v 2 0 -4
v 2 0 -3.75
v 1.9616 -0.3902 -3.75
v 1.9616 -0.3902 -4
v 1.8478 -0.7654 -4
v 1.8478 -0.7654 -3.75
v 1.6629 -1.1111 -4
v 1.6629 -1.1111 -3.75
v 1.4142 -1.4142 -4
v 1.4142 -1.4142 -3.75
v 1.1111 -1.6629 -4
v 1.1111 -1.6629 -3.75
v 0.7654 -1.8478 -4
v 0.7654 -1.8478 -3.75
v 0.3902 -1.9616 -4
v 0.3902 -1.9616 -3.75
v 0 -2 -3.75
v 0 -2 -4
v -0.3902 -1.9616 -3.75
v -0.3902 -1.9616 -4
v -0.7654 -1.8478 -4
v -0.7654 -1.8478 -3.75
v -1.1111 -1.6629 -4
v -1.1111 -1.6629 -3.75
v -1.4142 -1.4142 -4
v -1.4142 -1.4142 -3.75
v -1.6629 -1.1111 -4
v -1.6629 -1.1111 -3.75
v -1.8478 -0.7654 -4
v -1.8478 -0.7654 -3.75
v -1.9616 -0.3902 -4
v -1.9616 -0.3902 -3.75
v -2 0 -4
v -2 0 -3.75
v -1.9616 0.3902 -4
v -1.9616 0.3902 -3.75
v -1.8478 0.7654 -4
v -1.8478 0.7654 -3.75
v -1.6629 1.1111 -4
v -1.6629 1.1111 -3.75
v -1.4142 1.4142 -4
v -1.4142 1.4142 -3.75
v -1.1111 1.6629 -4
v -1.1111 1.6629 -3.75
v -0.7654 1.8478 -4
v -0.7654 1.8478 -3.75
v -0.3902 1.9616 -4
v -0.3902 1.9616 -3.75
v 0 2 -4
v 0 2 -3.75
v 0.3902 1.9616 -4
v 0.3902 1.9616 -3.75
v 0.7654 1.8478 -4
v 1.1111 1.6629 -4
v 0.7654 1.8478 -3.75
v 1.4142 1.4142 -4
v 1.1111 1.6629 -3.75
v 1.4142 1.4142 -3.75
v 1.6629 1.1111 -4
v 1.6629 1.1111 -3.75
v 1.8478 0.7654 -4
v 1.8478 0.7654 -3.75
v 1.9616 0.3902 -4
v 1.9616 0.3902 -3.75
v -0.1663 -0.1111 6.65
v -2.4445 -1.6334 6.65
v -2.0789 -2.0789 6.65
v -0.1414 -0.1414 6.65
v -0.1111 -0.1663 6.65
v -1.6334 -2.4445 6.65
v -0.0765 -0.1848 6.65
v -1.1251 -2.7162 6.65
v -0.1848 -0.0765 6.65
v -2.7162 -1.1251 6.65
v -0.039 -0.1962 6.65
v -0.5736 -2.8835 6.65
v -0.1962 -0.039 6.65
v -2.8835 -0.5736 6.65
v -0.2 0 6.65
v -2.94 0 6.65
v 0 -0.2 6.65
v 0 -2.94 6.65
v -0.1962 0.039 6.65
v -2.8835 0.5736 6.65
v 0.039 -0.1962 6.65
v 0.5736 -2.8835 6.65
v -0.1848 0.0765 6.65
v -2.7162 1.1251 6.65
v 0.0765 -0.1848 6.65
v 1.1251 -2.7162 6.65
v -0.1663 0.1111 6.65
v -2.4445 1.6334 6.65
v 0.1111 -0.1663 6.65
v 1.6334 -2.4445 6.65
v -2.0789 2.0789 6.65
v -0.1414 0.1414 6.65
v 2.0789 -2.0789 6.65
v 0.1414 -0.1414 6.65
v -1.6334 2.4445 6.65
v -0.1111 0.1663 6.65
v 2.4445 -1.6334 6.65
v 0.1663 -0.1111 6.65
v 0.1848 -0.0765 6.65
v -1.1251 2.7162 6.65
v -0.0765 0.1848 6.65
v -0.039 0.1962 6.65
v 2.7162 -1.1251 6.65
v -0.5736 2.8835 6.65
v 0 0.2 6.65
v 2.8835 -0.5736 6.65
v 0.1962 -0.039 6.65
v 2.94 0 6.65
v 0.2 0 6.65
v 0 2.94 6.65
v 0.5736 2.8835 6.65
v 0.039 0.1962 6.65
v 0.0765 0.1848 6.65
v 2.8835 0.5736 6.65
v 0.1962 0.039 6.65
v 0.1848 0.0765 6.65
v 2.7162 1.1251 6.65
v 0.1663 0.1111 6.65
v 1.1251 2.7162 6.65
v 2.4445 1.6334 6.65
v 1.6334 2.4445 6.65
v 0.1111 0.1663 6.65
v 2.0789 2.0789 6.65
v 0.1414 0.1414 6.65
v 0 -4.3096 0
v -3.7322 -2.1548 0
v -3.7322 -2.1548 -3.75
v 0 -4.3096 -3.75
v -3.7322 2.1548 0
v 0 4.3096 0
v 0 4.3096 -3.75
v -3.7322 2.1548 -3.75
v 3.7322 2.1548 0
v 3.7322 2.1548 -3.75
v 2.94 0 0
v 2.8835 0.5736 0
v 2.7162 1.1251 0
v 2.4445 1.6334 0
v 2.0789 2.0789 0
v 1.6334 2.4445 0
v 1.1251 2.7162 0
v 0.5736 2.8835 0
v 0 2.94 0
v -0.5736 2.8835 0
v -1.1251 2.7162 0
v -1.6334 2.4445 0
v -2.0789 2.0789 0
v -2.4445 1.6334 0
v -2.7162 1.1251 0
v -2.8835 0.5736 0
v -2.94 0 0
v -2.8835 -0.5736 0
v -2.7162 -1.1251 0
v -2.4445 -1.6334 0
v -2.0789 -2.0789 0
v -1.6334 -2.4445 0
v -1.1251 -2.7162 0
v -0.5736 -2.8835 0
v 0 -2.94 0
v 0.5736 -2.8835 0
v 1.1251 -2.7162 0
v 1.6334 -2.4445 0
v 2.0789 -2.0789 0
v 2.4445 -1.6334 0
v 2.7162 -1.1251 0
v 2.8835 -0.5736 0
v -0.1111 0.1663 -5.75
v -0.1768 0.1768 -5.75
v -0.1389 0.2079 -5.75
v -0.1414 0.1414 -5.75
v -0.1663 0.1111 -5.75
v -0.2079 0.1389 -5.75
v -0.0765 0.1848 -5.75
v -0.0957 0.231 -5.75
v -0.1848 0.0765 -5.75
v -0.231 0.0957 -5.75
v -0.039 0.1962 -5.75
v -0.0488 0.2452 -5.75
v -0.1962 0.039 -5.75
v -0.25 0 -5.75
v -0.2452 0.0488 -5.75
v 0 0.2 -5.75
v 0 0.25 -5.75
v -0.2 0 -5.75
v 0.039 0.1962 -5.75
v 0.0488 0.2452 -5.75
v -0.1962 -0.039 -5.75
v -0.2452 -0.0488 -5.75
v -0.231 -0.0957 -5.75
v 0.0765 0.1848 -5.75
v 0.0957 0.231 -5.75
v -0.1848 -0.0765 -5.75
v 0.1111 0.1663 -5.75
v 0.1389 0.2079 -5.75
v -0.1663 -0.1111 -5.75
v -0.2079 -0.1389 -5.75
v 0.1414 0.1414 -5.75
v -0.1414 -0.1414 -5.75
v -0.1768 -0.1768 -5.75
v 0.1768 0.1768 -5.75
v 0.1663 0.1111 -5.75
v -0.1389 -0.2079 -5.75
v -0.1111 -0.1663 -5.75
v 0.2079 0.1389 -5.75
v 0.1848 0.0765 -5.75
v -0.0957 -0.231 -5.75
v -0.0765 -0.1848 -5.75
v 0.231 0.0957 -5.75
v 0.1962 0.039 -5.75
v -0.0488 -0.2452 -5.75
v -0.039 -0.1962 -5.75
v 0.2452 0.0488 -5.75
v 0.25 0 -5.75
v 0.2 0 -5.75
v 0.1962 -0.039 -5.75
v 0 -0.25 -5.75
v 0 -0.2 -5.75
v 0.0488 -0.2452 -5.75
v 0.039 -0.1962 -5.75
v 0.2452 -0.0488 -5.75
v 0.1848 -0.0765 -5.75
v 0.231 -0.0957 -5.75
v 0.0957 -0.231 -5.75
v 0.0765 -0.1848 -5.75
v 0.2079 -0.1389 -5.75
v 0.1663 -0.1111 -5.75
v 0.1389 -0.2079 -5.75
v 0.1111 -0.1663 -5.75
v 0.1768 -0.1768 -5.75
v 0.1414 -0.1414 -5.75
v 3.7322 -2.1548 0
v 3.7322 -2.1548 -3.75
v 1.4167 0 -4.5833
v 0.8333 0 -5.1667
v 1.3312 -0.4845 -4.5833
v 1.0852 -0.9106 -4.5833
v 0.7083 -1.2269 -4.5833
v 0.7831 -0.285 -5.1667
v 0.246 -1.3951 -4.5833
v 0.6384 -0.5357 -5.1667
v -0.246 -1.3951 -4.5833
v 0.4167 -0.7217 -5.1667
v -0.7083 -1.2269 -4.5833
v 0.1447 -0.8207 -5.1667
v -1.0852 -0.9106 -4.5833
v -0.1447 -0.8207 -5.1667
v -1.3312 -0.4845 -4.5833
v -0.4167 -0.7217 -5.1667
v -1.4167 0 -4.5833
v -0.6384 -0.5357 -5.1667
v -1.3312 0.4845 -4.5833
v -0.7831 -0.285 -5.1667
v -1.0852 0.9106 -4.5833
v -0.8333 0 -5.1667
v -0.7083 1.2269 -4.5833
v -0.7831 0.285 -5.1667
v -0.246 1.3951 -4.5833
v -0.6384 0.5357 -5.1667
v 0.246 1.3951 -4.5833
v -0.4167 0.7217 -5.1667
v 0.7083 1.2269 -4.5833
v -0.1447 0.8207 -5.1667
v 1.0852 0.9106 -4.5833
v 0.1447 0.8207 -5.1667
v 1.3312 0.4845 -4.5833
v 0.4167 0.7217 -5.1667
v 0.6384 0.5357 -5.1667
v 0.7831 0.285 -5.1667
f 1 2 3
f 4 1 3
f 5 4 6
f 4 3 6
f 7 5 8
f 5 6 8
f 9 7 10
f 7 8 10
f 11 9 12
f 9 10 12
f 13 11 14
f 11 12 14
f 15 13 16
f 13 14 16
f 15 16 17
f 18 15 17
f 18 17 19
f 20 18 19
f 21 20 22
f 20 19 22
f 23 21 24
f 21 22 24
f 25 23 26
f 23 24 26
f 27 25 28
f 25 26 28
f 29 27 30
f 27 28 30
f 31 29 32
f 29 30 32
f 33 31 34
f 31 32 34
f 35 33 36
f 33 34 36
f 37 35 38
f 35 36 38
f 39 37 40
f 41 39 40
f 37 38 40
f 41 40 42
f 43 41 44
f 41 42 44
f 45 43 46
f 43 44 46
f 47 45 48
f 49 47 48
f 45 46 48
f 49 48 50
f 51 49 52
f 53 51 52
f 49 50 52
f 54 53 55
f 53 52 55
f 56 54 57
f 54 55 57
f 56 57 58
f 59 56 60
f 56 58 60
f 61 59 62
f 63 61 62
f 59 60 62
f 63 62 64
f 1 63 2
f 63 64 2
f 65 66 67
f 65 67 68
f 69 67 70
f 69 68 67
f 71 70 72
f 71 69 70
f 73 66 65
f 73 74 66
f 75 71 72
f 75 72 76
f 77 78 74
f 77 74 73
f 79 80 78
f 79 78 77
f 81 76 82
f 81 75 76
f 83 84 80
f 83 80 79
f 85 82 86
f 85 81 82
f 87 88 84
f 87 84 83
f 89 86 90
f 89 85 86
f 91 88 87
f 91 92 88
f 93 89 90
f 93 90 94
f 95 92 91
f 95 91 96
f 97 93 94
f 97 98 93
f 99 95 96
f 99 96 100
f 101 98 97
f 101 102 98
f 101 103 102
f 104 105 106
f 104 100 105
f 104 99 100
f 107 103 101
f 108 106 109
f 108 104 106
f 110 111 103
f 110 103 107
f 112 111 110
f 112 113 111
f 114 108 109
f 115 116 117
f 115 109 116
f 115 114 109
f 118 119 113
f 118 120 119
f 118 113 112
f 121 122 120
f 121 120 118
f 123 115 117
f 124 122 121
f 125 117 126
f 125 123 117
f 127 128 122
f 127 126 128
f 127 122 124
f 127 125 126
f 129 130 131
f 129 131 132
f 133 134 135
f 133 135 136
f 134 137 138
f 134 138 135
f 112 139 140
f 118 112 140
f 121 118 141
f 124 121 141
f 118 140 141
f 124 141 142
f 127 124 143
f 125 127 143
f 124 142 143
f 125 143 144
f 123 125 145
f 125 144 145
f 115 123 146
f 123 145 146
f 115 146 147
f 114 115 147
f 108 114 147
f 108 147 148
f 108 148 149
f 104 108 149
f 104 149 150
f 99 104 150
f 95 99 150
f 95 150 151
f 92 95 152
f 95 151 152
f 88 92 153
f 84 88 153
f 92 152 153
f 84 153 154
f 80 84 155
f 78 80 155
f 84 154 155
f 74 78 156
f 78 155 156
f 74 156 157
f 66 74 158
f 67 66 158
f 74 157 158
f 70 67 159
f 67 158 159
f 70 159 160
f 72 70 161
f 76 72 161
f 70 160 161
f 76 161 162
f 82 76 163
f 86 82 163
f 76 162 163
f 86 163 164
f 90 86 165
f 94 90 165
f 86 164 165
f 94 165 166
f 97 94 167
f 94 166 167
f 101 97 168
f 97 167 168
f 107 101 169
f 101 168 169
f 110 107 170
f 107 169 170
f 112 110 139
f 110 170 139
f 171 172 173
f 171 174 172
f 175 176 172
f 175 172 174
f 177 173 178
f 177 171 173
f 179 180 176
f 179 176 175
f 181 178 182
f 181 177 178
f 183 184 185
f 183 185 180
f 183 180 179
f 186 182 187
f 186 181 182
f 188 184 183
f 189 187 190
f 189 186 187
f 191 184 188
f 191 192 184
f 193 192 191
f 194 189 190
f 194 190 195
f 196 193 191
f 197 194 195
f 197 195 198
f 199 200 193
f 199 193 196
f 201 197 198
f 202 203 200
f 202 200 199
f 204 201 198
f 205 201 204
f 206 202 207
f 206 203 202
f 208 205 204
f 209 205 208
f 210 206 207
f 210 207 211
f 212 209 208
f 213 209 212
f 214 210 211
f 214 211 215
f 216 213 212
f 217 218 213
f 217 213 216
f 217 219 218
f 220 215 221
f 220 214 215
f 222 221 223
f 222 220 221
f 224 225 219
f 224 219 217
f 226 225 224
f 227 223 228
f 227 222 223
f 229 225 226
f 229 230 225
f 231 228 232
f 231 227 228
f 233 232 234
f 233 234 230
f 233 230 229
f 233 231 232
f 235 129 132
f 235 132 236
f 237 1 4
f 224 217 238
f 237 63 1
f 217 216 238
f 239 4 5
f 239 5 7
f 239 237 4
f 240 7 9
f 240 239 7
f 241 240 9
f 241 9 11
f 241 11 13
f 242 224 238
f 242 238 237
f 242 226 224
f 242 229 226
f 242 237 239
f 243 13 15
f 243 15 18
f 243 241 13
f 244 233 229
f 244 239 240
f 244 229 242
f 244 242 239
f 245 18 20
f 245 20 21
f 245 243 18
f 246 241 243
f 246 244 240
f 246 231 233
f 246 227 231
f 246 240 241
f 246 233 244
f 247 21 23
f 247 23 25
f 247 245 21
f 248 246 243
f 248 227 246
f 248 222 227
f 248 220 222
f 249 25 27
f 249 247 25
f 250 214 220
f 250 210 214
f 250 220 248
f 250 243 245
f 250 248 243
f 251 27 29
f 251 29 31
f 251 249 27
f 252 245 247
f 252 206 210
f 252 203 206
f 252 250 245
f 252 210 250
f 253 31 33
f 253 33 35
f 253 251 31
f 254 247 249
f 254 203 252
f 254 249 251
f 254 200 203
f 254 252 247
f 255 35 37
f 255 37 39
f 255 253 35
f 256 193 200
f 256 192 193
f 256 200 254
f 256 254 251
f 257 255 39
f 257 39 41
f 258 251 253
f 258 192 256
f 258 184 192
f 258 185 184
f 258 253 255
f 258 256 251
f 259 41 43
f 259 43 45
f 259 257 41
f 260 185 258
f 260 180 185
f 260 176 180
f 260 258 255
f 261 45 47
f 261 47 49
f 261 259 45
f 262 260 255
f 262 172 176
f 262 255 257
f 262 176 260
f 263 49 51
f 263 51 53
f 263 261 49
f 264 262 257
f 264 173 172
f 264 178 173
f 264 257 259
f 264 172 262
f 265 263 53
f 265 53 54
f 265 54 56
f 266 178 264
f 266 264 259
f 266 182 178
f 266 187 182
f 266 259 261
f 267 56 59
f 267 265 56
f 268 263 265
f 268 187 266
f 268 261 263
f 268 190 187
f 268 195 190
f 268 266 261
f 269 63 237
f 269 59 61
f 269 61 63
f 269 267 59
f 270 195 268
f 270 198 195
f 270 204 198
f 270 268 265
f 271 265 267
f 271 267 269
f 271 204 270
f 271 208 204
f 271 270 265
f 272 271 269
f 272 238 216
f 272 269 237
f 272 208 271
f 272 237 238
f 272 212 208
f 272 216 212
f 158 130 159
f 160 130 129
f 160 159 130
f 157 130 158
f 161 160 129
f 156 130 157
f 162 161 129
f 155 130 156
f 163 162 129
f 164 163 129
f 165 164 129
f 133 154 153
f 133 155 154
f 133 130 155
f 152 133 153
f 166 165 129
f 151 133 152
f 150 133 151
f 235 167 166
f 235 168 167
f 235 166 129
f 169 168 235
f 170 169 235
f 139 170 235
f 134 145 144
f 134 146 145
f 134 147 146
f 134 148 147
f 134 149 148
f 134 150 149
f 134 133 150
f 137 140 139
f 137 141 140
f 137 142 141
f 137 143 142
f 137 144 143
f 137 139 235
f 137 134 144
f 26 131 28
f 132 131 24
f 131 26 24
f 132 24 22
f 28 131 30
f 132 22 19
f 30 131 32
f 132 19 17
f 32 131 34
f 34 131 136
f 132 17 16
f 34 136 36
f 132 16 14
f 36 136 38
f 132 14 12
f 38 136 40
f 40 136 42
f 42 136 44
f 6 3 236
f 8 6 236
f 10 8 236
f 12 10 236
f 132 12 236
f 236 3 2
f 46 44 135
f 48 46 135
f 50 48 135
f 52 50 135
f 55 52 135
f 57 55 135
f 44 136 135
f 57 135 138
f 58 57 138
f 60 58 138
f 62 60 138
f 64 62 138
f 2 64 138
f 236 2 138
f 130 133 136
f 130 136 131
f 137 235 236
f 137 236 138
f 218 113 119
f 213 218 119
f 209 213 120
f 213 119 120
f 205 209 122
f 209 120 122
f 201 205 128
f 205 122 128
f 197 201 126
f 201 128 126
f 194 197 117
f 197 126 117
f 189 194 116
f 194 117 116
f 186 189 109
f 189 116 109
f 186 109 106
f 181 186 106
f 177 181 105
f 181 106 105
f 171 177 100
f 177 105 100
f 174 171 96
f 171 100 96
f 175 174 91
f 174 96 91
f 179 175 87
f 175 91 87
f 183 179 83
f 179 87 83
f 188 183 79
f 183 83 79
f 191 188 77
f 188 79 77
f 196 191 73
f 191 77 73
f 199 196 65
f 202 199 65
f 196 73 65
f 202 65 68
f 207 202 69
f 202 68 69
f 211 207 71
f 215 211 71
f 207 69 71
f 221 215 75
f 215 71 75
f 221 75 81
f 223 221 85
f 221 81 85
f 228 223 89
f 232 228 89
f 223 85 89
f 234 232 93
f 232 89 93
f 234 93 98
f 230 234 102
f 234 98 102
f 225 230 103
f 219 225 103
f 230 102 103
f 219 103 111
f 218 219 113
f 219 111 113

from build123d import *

# Parameters (mm, degrees)
F1_DEPTH = 3.75
F2_R     = 2.94
F3_DEPTH = 6.65
F4_R     = 2
F5_DEPTH = 2
F6_SIZE  = 1.75
F7_R     = 0.2
F8_DEPTH = 12.4


with BuildPart() as f1:
    # F0 (on Top) → F1 (new body)
    with BuildSketch(Plane.XY):
        Polygon((3.732228, -2.154803), (3.732228, 2.154803), (0, 4.309605), (-3.732228, 2.154803), (-3.732228, -2.154803), (0, -4.309605), align=None)
    extrude(amount=-F1_DEPTH)

    # F2 (on face) → F3 (join)
    with BuildSketch(Plane.XY):
        Circle(F2_R)
    extrude(amount=F3_DEPTH)

    # F4 (on face) → F5 (join)
    with BuildSketch(Plane(origin=(0, 0, -3.75), x_dir=(1, 0, 0), z_dir=(0, 0, -1))):
        Circle(F4_R)
    extrude(amount=F5_DEPTH)

    # F6
    f6_edges = [f1.edges().sort_by_distance(p)[0] for p in [
        (-2, 0, -5.75),
    ]]
    chamfer(f6_edges, length=F6_SIZE)

    # F7 (on face) → F8 (cut, through all)
    with BuildSketch(Plane.XY.offset(6.65)):
        Circle(F7_R)
    extrude(amount=-F8_DEPTH, mode=Mode.SUBTRACT)


solid = f1.part
